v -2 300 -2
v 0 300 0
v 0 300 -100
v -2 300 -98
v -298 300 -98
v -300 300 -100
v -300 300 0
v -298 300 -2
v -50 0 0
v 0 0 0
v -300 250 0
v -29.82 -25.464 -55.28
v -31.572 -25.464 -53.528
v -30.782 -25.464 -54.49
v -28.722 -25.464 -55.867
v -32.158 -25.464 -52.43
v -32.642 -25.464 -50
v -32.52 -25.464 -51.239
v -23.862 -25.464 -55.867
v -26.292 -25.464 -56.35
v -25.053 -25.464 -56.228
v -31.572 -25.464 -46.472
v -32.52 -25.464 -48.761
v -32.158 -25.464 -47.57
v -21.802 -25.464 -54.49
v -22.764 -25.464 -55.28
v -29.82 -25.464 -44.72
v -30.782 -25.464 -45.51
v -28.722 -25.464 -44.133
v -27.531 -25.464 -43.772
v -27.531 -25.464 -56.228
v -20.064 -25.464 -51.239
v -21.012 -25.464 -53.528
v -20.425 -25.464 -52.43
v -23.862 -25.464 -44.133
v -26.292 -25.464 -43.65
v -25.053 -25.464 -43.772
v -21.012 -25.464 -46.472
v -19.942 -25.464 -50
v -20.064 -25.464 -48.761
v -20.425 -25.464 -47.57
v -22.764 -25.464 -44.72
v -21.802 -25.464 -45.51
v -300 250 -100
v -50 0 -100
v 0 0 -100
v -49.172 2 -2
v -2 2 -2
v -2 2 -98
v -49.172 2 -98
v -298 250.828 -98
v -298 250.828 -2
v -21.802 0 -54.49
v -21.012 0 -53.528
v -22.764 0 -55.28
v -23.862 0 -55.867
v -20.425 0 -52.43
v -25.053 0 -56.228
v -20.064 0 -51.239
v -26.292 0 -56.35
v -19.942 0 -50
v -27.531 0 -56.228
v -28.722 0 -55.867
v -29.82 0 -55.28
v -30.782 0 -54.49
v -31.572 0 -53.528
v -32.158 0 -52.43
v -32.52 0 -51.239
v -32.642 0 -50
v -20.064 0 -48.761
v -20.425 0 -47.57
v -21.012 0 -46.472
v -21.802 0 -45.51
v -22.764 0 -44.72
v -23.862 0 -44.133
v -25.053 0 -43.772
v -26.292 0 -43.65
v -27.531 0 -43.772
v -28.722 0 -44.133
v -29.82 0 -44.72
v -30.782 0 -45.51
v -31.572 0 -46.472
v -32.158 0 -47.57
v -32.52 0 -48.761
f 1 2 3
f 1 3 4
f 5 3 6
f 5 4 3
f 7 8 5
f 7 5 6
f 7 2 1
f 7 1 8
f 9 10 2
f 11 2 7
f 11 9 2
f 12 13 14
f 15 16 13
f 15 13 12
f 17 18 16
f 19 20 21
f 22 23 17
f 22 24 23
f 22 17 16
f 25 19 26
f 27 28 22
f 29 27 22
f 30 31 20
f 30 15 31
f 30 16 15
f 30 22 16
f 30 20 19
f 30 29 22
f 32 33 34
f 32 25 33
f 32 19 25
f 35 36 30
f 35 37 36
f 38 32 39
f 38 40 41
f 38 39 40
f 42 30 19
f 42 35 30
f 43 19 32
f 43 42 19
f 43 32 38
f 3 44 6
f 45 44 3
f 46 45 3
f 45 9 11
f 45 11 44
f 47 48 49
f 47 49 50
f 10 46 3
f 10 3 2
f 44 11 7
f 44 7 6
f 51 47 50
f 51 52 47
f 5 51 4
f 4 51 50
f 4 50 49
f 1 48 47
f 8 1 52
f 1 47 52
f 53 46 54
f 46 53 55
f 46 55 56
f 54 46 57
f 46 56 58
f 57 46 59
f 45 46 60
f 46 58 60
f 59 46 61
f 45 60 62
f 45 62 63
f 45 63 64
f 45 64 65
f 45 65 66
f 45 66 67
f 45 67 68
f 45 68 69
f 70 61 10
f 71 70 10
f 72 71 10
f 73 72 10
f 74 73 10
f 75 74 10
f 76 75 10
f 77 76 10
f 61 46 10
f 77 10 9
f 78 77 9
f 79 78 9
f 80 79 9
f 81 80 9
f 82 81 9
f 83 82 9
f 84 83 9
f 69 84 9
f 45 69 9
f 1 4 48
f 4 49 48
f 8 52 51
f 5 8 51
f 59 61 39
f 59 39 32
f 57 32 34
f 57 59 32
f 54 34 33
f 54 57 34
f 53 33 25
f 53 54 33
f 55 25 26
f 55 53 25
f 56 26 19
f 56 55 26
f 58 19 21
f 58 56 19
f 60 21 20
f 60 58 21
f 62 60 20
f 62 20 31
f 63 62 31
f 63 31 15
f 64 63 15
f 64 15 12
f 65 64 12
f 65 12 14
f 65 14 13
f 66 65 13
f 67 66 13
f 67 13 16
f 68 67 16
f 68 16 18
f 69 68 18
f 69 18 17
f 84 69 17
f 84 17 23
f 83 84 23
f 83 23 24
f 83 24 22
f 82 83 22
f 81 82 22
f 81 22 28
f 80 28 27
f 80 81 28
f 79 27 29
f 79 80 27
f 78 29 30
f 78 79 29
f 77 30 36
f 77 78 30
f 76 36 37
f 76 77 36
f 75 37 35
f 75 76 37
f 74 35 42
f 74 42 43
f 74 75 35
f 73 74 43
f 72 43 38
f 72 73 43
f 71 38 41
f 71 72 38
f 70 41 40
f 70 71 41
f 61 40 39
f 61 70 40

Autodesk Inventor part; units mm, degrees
ref_plane "YZ Plane" through (0, 0, 0) normal (1, 0, 0) x (0, 1, 0)
ref_plane "XZ Plane" through (0, 0, 0) normal (0, 1, 0) x (-1, 0, 0)
ref_plane "XY Plane" through (0, 0, 0) normal (0, 0, 1) x (1, 0, 0)
sketch "Sketch1" plane through (0, 0, 0) normal (0, 1, 0) x (-1, 0, 0)
  line L0 (0, 0) -> (300, 0)
  line L1 (300, 0) -> (300, -100)
  line L2 (300, -100) -> (0, -100)
  line L3 (0, -100) -> (0, 0)
  dimension "d0" = 300
  dimension "d1" = 100
extrude "Extrusion1" add sketch "Sketch1" along normal blind 300
chamfer "Chamfer1" distance 250 distance2 250 1 edges at (-300, 0, -50) measured on face at (-100, 0, -33.3333)
shell "Shell1" thickness 2 removed faces 1 at (-100, 300, -33.3333)
sketch "Sketch2" plane through (0, 0, 0) normal (0, -1, 0) x (1, 0, 0)
  circle A0 centre (-26.2917, -50) radius 6.35
  point P0 (0, 0)
  dimension "d8" = 12.7
extrude "Extrusion2" add sketch "Sketch2" along normal blind 50
sketch "Sketch3" plane through (0, 0, 0) normal (1, 0, 0) x (0, 1, 0)
  circle A0 centre (-44.5235, -49.6457) radius 6.35
  point P0 (0, 0)
  dimension "d11" = 12.7
extrude "Extrusion3" add sketch "Sketch3" against normal blind 32 and the other way blind 200
fillet_without_effect "Fillet1"
sketch "Sketch4" plane through (0, 0, 0) normal (0, 0, 1) x (1, 0, 0)
  line L0 (-39.055, -25.4645) -> (218.0396, -25.4645)
  line L1 (218.0396, -25.4645) -> (218.0396, -67.5796)
  line L2 (218.0396, -67.5796) -> (-39.055, -67.5796)
  line L3 (-39.055, -67.5796) -> (-39.055, -25.4645)
  point P0 (0, 0)
extrude "Extrusion4" cut sketch "Sketch4" against normal blind 254
equation "\"BendRadius\" = Thickness"
equation "\"BendReliefWidth\" = Thickness"
equation "\"BendReliefDepth\" = 0.5 * Thickness"
equation "\"CornerReliefSize\" = 4 * Thickness"
equation "\"MinimumRemnant\" = 2 * Thickness"
equation "\"TransitionRadius\" = BendRadius"
equation "\"JacobiRadiusSize\" = Thickness"
equation "\"GapSize\" = Thickness"
equation "\"Thickness\" = 3.048"
properties part number "hopper 2"
